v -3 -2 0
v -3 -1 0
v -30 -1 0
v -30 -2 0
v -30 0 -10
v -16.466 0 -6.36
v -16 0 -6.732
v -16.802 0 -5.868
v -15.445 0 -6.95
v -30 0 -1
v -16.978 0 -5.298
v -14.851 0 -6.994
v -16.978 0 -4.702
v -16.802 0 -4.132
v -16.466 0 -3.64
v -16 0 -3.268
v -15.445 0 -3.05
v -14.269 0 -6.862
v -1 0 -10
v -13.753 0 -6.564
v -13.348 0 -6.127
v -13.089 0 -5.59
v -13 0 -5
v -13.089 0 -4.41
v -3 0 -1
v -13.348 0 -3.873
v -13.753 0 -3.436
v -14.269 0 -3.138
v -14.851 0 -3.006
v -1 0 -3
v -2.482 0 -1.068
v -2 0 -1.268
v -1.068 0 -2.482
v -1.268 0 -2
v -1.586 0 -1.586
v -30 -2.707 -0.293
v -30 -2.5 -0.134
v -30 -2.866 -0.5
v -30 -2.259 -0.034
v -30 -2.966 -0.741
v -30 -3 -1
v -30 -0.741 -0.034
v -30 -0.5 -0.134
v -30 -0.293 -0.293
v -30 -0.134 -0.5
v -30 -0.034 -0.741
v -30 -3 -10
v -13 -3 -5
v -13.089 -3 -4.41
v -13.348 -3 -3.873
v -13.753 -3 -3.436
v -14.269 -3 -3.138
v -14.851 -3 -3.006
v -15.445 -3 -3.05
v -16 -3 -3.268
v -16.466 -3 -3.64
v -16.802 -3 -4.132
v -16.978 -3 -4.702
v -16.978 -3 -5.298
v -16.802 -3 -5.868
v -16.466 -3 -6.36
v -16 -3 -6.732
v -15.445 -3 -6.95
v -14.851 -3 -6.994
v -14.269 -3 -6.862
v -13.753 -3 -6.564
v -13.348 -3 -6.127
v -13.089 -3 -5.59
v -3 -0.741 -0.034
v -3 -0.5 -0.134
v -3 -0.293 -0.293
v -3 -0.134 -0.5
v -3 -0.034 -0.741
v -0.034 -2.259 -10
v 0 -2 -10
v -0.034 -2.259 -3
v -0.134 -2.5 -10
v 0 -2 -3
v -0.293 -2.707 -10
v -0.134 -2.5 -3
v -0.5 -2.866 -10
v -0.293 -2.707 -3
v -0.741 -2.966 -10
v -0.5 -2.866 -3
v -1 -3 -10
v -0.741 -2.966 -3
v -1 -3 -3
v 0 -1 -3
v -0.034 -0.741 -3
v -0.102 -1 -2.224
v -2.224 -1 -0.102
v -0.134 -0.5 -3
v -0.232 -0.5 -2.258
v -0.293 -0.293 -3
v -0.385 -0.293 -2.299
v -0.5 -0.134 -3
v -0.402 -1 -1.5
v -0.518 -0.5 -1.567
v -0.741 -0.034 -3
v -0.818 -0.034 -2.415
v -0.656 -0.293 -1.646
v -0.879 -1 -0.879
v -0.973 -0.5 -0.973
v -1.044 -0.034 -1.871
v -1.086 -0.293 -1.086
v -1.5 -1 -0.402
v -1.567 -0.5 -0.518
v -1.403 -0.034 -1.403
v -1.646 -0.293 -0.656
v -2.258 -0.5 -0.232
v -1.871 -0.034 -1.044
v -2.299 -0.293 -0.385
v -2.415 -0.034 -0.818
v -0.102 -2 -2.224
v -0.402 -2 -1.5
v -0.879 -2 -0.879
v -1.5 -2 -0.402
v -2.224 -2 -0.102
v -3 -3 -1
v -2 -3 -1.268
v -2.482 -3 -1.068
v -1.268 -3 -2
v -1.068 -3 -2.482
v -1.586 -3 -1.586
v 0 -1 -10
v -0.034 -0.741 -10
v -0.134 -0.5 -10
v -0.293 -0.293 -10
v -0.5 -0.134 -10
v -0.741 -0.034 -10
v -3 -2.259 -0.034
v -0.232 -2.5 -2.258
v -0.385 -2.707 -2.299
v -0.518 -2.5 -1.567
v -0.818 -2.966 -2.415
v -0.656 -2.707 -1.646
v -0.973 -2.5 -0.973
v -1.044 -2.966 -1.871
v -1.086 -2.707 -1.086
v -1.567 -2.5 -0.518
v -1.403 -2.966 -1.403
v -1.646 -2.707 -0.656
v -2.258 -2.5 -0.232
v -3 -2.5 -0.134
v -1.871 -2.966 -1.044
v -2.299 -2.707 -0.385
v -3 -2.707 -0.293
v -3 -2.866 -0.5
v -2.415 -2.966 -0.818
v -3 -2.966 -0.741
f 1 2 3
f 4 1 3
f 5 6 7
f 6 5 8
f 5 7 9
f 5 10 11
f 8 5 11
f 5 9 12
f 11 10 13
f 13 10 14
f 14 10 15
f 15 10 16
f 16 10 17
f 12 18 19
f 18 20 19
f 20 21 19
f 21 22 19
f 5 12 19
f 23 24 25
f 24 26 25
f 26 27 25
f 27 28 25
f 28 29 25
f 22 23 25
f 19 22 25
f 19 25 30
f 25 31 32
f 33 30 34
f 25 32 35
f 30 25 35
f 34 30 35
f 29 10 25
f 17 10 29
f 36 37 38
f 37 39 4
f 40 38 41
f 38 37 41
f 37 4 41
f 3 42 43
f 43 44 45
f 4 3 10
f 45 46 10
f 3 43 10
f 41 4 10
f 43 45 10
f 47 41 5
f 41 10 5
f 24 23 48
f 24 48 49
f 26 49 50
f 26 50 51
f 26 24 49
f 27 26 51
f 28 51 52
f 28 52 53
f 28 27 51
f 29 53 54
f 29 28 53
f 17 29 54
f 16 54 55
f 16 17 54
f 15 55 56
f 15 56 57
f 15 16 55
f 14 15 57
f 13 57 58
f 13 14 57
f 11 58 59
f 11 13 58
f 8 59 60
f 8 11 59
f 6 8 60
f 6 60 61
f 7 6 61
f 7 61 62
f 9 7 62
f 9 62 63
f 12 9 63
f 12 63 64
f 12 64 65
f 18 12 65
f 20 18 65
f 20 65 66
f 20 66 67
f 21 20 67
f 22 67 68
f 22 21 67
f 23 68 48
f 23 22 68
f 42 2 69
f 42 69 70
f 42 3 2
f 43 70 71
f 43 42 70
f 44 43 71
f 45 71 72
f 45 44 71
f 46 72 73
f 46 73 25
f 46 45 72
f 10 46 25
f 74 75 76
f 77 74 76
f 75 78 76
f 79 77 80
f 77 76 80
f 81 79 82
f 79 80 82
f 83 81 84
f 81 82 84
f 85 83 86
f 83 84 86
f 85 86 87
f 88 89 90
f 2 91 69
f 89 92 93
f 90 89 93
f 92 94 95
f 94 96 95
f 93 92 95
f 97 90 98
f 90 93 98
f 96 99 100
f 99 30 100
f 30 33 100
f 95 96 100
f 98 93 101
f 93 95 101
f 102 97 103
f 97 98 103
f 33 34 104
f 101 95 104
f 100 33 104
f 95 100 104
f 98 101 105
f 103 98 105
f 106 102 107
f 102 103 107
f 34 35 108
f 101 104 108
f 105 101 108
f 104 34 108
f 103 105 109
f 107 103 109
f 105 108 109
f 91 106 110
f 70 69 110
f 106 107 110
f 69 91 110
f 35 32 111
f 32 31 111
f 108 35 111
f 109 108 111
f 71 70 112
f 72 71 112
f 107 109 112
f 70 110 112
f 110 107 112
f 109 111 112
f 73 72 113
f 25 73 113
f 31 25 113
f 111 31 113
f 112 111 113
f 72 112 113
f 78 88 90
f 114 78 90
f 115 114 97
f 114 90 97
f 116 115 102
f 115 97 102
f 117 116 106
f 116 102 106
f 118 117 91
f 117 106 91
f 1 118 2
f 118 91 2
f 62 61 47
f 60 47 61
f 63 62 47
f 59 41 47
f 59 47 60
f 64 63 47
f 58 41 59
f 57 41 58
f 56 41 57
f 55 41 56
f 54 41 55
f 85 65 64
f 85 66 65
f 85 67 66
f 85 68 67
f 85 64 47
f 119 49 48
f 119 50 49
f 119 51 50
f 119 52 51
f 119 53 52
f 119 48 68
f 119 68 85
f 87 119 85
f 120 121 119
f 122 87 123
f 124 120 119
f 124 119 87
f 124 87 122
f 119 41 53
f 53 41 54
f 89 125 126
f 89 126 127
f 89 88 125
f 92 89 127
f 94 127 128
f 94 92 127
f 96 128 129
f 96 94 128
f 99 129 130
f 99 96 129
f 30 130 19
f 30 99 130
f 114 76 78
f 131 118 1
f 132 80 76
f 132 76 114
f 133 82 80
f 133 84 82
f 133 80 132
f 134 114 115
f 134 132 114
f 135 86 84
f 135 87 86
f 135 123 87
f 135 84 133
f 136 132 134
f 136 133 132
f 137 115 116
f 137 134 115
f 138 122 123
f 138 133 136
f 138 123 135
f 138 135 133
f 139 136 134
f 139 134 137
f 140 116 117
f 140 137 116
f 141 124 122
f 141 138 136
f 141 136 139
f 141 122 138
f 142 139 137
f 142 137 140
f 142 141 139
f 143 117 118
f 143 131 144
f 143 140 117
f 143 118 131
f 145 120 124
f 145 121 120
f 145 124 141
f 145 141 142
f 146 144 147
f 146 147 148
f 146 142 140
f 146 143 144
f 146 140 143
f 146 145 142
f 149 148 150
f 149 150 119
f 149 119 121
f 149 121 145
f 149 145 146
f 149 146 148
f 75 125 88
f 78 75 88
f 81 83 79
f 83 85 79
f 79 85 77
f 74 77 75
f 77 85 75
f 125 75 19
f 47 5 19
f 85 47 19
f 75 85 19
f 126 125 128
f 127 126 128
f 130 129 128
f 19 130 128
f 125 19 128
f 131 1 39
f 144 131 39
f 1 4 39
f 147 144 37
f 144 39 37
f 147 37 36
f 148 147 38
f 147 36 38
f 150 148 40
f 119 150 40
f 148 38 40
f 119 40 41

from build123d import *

# Parameters (mm, degrees)
F0_R     = 2
F1_DEPTH = 3
F2_R     = 1


with BuildPart() as f1:
    # F0 (on Front) → F1 (new body)
    with BuildSketch(Plane.XZ):
        with BuildLine():
            ThreePointArc((0, -3), (-0.87868, -0.87868), (-3, 0))
            Line((-3, 0), (-30, 0))
            Line((-30, 0), (-30, -10))
            Line((-30, -10), (0, -10))
            Line((0, -10), (0, -3))
        make_face()
        with Locations((-15, -5)):
            Circle(F0_R, mode=Mode.SUBTRACT)
    extrude(amount=F1_DEPTH)

    # F2
    f2_edges = [f1.edges().sort_by_distance(p)[0] for p in [
        (-16.5, -3, 0),
        (-16.5, 0, 0),
    ]]
    fillet(f2_edges, radius=F2_R)


solid = f1.part
